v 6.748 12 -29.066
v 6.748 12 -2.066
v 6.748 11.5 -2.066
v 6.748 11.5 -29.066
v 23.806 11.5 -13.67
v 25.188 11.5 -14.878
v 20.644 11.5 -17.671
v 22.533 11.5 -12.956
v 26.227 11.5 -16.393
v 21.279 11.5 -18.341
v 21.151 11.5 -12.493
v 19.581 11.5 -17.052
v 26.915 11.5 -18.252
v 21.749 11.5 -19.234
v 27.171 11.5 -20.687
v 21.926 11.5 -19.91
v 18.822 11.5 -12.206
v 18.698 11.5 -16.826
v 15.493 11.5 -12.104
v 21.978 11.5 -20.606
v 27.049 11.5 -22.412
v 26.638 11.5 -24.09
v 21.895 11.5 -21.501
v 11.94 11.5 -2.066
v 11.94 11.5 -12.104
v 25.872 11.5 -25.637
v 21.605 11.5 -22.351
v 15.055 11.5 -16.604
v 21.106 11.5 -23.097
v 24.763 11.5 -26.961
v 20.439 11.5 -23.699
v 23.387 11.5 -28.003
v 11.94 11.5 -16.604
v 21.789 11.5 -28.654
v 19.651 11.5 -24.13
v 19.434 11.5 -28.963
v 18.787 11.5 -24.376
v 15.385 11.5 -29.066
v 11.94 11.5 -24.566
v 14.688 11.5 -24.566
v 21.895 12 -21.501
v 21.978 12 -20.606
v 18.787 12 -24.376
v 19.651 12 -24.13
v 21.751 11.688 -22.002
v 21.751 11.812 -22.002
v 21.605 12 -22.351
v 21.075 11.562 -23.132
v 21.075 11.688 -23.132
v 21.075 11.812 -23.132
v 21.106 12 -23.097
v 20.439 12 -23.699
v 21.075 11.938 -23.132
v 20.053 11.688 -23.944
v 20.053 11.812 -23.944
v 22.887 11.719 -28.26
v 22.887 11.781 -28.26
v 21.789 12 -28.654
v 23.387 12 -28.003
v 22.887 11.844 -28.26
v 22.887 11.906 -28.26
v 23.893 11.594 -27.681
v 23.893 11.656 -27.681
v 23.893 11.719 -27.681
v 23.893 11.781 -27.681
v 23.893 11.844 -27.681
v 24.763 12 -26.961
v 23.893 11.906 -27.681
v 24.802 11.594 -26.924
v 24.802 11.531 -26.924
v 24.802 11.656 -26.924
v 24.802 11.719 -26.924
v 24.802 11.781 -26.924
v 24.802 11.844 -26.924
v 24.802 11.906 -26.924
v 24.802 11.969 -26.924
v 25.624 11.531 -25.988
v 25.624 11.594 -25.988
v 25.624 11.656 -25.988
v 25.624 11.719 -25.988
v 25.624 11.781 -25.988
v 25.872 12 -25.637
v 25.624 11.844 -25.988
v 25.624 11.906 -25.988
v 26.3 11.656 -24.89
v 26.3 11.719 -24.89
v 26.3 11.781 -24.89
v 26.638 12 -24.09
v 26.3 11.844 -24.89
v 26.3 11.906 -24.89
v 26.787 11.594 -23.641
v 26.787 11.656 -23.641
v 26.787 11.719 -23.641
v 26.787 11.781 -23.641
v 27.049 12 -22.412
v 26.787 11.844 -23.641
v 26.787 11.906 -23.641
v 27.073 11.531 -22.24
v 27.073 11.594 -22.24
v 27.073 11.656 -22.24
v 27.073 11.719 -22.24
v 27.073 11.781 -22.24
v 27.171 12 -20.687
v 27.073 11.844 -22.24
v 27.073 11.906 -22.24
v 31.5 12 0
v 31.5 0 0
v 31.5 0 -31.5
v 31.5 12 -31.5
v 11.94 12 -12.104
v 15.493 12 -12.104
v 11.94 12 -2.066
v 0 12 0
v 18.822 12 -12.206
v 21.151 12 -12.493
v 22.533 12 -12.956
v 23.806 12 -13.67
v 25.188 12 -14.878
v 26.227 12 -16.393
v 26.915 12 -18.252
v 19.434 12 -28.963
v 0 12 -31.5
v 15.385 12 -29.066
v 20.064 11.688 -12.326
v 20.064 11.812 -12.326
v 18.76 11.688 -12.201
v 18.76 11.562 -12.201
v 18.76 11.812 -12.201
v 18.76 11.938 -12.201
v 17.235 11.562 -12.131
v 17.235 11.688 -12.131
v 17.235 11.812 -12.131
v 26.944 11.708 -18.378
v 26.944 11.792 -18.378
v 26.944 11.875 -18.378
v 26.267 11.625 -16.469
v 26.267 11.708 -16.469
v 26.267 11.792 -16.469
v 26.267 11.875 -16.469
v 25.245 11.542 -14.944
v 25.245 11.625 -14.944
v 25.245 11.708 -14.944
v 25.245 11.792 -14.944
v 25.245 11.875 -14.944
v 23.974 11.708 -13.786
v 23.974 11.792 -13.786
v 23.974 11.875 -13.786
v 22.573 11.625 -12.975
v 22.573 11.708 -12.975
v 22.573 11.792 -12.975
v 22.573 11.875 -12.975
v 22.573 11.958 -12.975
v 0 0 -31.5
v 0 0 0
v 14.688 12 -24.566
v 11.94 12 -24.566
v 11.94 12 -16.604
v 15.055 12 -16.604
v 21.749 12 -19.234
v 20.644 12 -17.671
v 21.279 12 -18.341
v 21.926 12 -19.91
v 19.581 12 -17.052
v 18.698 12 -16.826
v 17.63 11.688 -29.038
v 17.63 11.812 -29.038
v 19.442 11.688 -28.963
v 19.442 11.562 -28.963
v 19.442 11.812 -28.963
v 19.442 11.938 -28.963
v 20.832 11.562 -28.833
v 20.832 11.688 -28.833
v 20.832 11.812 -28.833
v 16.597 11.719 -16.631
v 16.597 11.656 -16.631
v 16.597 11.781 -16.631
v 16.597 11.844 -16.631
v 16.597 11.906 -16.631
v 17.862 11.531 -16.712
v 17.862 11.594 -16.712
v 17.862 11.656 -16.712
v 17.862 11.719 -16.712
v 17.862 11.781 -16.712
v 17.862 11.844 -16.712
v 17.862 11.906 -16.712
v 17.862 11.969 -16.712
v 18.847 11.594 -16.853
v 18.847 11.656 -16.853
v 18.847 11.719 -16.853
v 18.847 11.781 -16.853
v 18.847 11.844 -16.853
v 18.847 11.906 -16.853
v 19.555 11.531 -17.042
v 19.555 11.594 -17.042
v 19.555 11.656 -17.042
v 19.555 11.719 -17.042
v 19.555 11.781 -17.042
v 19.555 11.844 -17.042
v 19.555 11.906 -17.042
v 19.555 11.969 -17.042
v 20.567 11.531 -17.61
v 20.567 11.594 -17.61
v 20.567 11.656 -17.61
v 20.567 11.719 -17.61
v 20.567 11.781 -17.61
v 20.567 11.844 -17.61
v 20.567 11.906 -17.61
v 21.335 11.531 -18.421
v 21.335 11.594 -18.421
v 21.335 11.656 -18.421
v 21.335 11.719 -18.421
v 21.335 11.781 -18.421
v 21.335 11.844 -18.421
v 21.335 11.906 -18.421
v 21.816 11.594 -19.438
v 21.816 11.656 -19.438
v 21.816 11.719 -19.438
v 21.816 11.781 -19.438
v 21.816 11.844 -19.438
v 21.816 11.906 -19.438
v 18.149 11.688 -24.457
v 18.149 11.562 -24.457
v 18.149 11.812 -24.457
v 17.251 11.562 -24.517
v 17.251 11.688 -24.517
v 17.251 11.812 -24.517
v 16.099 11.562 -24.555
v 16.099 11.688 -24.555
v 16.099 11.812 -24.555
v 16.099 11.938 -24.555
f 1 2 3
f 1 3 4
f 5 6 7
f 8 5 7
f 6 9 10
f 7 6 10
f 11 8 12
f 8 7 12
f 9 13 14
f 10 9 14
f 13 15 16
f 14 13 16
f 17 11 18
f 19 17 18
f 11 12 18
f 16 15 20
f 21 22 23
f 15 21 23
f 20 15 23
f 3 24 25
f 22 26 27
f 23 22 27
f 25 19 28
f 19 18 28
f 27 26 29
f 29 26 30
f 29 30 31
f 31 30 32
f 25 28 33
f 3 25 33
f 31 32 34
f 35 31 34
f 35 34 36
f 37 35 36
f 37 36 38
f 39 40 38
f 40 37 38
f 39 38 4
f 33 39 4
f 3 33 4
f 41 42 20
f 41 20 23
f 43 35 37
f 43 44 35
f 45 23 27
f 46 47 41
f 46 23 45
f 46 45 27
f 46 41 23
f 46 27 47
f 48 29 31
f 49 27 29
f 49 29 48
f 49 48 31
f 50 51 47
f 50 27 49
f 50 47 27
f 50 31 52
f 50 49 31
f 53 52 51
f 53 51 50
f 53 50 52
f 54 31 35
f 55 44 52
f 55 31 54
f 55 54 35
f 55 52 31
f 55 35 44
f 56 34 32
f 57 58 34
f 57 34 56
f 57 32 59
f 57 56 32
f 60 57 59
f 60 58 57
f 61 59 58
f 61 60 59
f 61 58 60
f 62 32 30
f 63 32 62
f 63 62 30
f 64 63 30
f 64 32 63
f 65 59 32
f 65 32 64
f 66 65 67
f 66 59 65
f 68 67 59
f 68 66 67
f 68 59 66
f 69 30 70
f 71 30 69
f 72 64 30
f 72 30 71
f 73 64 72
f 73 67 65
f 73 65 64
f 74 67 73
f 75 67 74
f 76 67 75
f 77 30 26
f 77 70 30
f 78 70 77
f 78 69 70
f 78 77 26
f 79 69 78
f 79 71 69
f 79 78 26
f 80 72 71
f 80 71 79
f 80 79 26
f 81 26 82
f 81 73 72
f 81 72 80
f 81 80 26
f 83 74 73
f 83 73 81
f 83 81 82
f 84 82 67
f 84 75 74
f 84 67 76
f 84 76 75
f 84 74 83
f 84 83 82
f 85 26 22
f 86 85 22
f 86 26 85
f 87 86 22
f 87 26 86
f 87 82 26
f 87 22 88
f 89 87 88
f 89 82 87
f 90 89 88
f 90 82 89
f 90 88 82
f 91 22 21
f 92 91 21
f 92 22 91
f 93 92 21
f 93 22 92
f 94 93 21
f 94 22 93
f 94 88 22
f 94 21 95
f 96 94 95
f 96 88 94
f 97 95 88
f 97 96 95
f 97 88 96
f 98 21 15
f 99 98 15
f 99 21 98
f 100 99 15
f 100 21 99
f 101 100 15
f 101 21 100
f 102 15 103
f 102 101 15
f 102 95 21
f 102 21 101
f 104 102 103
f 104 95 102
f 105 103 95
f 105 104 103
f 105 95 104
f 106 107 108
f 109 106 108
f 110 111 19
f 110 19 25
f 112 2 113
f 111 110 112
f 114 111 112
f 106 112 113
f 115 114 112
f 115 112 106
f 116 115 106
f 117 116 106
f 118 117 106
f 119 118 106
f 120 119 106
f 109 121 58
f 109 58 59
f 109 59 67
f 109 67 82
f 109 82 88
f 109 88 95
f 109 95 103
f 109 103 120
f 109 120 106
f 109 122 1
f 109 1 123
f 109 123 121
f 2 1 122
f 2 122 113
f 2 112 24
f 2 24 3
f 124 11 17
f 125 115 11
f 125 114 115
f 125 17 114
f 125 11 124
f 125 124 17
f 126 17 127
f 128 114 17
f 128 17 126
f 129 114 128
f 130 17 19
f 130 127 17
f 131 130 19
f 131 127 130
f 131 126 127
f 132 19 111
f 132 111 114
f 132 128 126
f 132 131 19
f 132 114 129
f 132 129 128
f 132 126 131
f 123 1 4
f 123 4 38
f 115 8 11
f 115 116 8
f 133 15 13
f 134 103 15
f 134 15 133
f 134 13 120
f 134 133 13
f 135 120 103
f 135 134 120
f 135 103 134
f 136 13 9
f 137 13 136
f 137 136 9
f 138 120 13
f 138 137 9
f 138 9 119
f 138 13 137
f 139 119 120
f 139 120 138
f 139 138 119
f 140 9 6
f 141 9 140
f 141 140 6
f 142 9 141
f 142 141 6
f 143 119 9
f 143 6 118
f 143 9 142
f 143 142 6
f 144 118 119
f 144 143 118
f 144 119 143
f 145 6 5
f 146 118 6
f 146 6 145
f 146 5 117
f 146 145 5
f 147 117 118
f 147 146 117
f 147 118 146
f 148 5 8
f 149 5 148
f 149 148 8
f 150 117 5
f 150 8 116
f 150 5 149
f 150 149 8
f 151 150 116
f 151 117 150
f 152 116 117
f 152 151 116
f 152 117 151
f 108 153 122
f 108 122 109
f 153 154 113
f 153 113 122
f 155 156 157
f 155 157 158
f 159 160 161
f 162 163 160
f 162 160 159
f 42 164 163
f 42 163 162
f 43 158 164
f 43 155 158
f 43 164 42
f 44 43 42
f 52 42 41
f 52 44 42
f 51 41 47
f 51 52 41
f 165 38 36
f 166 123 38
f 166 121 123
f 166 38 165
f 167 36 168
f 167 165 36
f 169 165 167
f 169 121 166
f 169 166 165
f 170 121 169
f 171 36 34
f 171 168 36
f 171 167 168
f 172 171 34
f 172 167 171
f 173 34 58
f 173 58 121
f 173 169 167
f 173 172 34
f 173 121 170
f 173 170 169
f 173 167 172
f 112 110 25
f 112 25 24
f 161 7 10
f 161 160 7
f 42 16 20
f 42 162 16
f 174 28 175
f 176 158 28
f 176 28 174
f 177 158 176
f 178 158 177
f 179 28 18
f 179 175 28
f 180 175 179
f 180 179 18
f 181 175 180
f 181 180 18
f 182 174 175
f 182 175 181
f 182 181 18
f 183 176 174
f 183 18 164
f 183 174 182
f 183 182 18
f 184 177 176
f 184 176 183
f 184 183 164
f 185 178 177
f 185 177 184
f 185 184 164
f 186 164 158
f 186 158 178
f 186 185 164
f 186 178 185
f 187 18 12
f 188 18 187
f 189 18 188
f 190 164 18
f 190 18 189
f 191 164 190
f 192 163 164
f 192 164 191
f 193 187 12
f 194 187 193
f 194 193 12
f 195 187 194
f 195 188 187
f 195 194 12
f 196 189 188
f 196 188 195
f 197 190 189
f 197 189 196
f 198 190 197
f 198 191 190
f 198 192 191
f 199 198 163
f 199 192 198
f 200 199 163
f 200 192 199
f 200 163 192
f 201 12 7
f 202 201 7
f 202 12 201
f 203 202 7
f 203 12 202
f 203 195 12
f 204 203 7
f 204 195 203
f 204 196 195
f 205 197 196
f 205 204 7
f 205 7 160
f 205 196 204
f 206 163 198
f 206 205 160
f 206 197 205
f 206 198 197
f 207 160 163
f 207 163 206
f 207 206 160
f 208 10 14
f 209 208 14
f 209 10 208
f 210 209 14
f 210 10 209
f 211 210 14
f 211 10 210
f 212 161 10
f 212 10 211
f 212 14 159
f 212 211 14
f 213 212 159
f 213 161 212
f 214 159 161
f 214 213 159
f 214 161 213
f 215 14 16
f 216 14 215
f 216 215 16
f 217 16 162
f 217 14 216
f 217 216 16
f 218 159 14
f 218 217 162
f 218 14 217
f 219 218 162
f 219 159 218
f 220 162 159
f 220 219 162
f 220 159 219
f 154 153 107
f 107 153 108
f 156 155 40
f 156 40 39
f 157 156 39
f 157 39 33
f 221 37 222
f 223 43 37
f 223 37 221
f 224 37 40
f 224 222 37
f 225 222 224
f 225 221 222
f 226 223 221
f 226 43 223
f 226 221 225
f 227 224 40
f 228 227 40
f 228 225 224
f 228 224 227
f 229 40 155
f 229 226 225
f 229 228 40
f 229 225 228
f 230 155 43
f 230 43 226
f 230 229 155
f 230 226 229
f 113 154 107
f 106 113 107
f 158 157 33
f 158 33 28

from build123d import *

# Parameters (mm, degrees)
SKETCH1_W           = 31.5
SKETCH1_H           = 31.5
BOSS_EXTRUDE1_DEPTH = 12
CUT_EXTRUDE1_DEPTH  = 0.5


with BuildPart() as part:
    # Sketch1 → Boss-Extrude1 (new body)
    with BuildSketch(Plane(origin=(0, 0, 0), x_dir=(1, 0, 0), z_dir=(0, 1, 0))):
        with Locations((15.75, 15.75)):
            Rectangle(SKETCH1_W, SKETCH1_H)
    extrude(amount=BOSS_EXTRUDE1_DEPTH)

    # Sketch2 → Cut-Extrude1 (cut)
    with BuildSketch(Plane(origin=(0, 12, 0), x_dir=(1, 0, 0), z_dir=(0, 1, 0))):
        with BuildLine():
            Line((6.747621019, 2.065503665), (6.747621019, 29.065503665))
            Line((6.747621019, 29.065503665), (15.385241211, 29.065503665))
            add(Edge.make_bspline(
                [(15.385241211, 29.065503665), (15.776479961, 29.065076414), (16.524770581, 29.064259246), (17.592161888, 29.041554875), (18.553187847, 29.009414336), (19.406422141, 28.969384655), (20.154867078, 28.909652682), (20.795165219, 28.840483957), (21.331348478, 28.766076764), (21.647090916, 28.68907527), (21.789087365, 28.654445973)],
                knots=[0, 0, 0, 0, 1.460485487, 2.793352117, 3.985295279, 5.050041172, 5.981765236, 6.787433016, 7.454681457, 8, 8, 8, 8], degree=3))
            add(Edge.make_bspline(
                [(21.789087365, 28.654445973), (21.977908112, 28.600605902), (22.352673057, 28.493745974), (22.889594358, 28.265937582), (23.40710147, 28.001919809), (23.898692472, 27.687258347), (24.366038435, 27.327539547), (24.810528525, 26.925696963), (25.234533144, 26.479916594), (25.632186734, 25.991079052), (25.996390644, 25.461649309), (26.311154328, 24.890844616), (26.574860483, 24.281145984), (26.799533744, 23.63713522), (26.965298747, 22.951907486), (27.081304113, 22.230223822), (27.162058322, 21.471768579), (27.16777597, 20.952743669), (27.170697942, 20.687498858)],
                knots=[0, 0, 0, 0, 0.907145743, 1.80047177, 2.69161667, 3.591261238, 4.495029544, 5.415863088, 6.359363025, 7.337192411, 8.326890979, 9.326929023, 10.346104993, 11.395420813, 12.477187422, 13.601053412, 14.774031606, 16, 16, 16, 16], degree=3))
            add(Edge.make_bspline(
                [(27.170697942, 20.687498858), (27.162364492, 20.284694456), (27.146322143, 19.509273864), (26.966836725, 18.397614462), (26.693077309, 17.382185261), (26.292958142, 16.472766953), (25.805129757, 15.665790828), (25.267776748, 14.938305662), (24.654198579, 14.312238597), (23.991281493, 13.777486058), (23.290699292, 13.339866766), (22.588848894, 12.966802533), (21.876259855, 12.67997883), (21.390418234, 12.555007436), (21.150866211, 12.493388281)],
                knots=[0, 0, 0, 0, 1.312386234, 2.526415563, 3.661883817, 4.733421185, 5.753802465, 6.732107337, 7.675884281, 8.604170108, 9.50284679, 10.365392406, 11.194030444, 12, 12, 12, 12], degree=3))
            add(Edge.make_bspline(
                [(21.150866211, 12.493388281), (20.979885726, 12.460863774), (20.619479264, 12.392305995), (20.047896175, 12.323966368), (19.423124881, 12.24832185), (18.742595655, 12.198982246), (18.007131761, 12.152777775), (17.217018782, 12.130963119), (16.373385874, 12.104680889), (15.792719174, 12.10420863), (15.493414288, 12.103965204)],
                knots=[0, 0, 0, 0, 0.735353946, 1.55003838, 2.431865514, 3.394945452, 4.432993119, 5.54609699, 6.735134699, 8, 8, 8, 8], degree=3))
            Line((15.493414288, 12.103965204), (11.939928711, 12.103965204))
            Line((11.939928711, 12.103965204), (11.939928711, 2.065503665))
            Line((11.939928711, 2.065503665), (6.747621019, 2.065503665))
        make_face()
        with BuildLine():
            Line((11.939928711, 24.565503665), (11.939928711, 16.603965204))
            Line((11.939928711, 16.603965204), (15.055313327, 16.603965204))
            add(Edge.make_bspline(
                [(15.055313327, 16.603965204), (15.323966729, 16.604313087), (15.837934489, 16.604978632), (16.575364214, 16.628867789), (17.242886299, 16.658028936), (17.841895509, 16.7062966), (18.368776067, 16.769912227), (18.827056361, 16.846004529), (19.217270507, 16.927659519), (19.639233984, 17.062974924), (20.090397304, 17.281902908), (20.572186709, 17.596557411), (20.995438133, 17.97276398), (21.347639417, 18.414605566), (21.628970266, 18.905517169), (21.830403359, 19.440467762), (21.960468518, 20.010591345), (21.972348784, 20.405530729), (21.97839025, 20.60636905)],
                knots=[0, 0, 0, 0, 1.411705958, 2.700771114, 3.876961699, 4.922619712, 5.858038221, 6.66485904, 7.363650596, 7.950905807, 8.989198271, 9.987739806, 10.967313358, 11.951275539, 12.944273208, 13.927870418, 14.946261014, 16, 16, 16, 16], degree=3))
            add(Edge.make_bspline(
                [(21.97839025, 20.60636905), (21.969887549, 20.850986989), (21.953401934, 21.32526892), (21.77161162, 22.000725543), (21.491129938, 22.613710617), (21.090120764, 23.14515141), (20.605711119, 23.592049413), (20.061254895, 23.963884441), (19.445124983, 24.224097423), (19.009070151, 24.324920349), (18.787284481, 24.376200781)],
                knots=[0, 0, 0, 0, 1.085904563, 2.105425768, 3.088705091, 4.068969419, 5.045188284, 6.010769642, 6.988240112, 8, 8, 8, 8], degree=3))
            add(Edge.make_bspline(
                [(18.787284481, 24.376200781), (18.69184504, 24.391465541), (18.479999071, 24.425348577), (18.127867959, 24.460709738), (17.711296797, 24.492870678), (17.229783451, 24.519275772), (16.685236518, 24.53991844), (16.075859838, 24.558006509), (15.40325832, 24.559459645), (14.932712769, 24.563433173), (14.687524865, 24.565503665)],
                knots=[0, 0, 0, 0, 0.564603001, 1.253243608, 2.066786758, 3.005752288, 4.070476343, 5.250658742, 6.567396469, 8, 8, 8, 8], degree=3))
            Line((14.687524865, 24.565503665), (11.939928711, 24.565503665))
        make_face(mode=Mode.SUBTRACT)
    extrude(amount=-CUT_EXTRUDE1_DEPTH, mode=Mode.SUBTRACT)


solid = part.part
